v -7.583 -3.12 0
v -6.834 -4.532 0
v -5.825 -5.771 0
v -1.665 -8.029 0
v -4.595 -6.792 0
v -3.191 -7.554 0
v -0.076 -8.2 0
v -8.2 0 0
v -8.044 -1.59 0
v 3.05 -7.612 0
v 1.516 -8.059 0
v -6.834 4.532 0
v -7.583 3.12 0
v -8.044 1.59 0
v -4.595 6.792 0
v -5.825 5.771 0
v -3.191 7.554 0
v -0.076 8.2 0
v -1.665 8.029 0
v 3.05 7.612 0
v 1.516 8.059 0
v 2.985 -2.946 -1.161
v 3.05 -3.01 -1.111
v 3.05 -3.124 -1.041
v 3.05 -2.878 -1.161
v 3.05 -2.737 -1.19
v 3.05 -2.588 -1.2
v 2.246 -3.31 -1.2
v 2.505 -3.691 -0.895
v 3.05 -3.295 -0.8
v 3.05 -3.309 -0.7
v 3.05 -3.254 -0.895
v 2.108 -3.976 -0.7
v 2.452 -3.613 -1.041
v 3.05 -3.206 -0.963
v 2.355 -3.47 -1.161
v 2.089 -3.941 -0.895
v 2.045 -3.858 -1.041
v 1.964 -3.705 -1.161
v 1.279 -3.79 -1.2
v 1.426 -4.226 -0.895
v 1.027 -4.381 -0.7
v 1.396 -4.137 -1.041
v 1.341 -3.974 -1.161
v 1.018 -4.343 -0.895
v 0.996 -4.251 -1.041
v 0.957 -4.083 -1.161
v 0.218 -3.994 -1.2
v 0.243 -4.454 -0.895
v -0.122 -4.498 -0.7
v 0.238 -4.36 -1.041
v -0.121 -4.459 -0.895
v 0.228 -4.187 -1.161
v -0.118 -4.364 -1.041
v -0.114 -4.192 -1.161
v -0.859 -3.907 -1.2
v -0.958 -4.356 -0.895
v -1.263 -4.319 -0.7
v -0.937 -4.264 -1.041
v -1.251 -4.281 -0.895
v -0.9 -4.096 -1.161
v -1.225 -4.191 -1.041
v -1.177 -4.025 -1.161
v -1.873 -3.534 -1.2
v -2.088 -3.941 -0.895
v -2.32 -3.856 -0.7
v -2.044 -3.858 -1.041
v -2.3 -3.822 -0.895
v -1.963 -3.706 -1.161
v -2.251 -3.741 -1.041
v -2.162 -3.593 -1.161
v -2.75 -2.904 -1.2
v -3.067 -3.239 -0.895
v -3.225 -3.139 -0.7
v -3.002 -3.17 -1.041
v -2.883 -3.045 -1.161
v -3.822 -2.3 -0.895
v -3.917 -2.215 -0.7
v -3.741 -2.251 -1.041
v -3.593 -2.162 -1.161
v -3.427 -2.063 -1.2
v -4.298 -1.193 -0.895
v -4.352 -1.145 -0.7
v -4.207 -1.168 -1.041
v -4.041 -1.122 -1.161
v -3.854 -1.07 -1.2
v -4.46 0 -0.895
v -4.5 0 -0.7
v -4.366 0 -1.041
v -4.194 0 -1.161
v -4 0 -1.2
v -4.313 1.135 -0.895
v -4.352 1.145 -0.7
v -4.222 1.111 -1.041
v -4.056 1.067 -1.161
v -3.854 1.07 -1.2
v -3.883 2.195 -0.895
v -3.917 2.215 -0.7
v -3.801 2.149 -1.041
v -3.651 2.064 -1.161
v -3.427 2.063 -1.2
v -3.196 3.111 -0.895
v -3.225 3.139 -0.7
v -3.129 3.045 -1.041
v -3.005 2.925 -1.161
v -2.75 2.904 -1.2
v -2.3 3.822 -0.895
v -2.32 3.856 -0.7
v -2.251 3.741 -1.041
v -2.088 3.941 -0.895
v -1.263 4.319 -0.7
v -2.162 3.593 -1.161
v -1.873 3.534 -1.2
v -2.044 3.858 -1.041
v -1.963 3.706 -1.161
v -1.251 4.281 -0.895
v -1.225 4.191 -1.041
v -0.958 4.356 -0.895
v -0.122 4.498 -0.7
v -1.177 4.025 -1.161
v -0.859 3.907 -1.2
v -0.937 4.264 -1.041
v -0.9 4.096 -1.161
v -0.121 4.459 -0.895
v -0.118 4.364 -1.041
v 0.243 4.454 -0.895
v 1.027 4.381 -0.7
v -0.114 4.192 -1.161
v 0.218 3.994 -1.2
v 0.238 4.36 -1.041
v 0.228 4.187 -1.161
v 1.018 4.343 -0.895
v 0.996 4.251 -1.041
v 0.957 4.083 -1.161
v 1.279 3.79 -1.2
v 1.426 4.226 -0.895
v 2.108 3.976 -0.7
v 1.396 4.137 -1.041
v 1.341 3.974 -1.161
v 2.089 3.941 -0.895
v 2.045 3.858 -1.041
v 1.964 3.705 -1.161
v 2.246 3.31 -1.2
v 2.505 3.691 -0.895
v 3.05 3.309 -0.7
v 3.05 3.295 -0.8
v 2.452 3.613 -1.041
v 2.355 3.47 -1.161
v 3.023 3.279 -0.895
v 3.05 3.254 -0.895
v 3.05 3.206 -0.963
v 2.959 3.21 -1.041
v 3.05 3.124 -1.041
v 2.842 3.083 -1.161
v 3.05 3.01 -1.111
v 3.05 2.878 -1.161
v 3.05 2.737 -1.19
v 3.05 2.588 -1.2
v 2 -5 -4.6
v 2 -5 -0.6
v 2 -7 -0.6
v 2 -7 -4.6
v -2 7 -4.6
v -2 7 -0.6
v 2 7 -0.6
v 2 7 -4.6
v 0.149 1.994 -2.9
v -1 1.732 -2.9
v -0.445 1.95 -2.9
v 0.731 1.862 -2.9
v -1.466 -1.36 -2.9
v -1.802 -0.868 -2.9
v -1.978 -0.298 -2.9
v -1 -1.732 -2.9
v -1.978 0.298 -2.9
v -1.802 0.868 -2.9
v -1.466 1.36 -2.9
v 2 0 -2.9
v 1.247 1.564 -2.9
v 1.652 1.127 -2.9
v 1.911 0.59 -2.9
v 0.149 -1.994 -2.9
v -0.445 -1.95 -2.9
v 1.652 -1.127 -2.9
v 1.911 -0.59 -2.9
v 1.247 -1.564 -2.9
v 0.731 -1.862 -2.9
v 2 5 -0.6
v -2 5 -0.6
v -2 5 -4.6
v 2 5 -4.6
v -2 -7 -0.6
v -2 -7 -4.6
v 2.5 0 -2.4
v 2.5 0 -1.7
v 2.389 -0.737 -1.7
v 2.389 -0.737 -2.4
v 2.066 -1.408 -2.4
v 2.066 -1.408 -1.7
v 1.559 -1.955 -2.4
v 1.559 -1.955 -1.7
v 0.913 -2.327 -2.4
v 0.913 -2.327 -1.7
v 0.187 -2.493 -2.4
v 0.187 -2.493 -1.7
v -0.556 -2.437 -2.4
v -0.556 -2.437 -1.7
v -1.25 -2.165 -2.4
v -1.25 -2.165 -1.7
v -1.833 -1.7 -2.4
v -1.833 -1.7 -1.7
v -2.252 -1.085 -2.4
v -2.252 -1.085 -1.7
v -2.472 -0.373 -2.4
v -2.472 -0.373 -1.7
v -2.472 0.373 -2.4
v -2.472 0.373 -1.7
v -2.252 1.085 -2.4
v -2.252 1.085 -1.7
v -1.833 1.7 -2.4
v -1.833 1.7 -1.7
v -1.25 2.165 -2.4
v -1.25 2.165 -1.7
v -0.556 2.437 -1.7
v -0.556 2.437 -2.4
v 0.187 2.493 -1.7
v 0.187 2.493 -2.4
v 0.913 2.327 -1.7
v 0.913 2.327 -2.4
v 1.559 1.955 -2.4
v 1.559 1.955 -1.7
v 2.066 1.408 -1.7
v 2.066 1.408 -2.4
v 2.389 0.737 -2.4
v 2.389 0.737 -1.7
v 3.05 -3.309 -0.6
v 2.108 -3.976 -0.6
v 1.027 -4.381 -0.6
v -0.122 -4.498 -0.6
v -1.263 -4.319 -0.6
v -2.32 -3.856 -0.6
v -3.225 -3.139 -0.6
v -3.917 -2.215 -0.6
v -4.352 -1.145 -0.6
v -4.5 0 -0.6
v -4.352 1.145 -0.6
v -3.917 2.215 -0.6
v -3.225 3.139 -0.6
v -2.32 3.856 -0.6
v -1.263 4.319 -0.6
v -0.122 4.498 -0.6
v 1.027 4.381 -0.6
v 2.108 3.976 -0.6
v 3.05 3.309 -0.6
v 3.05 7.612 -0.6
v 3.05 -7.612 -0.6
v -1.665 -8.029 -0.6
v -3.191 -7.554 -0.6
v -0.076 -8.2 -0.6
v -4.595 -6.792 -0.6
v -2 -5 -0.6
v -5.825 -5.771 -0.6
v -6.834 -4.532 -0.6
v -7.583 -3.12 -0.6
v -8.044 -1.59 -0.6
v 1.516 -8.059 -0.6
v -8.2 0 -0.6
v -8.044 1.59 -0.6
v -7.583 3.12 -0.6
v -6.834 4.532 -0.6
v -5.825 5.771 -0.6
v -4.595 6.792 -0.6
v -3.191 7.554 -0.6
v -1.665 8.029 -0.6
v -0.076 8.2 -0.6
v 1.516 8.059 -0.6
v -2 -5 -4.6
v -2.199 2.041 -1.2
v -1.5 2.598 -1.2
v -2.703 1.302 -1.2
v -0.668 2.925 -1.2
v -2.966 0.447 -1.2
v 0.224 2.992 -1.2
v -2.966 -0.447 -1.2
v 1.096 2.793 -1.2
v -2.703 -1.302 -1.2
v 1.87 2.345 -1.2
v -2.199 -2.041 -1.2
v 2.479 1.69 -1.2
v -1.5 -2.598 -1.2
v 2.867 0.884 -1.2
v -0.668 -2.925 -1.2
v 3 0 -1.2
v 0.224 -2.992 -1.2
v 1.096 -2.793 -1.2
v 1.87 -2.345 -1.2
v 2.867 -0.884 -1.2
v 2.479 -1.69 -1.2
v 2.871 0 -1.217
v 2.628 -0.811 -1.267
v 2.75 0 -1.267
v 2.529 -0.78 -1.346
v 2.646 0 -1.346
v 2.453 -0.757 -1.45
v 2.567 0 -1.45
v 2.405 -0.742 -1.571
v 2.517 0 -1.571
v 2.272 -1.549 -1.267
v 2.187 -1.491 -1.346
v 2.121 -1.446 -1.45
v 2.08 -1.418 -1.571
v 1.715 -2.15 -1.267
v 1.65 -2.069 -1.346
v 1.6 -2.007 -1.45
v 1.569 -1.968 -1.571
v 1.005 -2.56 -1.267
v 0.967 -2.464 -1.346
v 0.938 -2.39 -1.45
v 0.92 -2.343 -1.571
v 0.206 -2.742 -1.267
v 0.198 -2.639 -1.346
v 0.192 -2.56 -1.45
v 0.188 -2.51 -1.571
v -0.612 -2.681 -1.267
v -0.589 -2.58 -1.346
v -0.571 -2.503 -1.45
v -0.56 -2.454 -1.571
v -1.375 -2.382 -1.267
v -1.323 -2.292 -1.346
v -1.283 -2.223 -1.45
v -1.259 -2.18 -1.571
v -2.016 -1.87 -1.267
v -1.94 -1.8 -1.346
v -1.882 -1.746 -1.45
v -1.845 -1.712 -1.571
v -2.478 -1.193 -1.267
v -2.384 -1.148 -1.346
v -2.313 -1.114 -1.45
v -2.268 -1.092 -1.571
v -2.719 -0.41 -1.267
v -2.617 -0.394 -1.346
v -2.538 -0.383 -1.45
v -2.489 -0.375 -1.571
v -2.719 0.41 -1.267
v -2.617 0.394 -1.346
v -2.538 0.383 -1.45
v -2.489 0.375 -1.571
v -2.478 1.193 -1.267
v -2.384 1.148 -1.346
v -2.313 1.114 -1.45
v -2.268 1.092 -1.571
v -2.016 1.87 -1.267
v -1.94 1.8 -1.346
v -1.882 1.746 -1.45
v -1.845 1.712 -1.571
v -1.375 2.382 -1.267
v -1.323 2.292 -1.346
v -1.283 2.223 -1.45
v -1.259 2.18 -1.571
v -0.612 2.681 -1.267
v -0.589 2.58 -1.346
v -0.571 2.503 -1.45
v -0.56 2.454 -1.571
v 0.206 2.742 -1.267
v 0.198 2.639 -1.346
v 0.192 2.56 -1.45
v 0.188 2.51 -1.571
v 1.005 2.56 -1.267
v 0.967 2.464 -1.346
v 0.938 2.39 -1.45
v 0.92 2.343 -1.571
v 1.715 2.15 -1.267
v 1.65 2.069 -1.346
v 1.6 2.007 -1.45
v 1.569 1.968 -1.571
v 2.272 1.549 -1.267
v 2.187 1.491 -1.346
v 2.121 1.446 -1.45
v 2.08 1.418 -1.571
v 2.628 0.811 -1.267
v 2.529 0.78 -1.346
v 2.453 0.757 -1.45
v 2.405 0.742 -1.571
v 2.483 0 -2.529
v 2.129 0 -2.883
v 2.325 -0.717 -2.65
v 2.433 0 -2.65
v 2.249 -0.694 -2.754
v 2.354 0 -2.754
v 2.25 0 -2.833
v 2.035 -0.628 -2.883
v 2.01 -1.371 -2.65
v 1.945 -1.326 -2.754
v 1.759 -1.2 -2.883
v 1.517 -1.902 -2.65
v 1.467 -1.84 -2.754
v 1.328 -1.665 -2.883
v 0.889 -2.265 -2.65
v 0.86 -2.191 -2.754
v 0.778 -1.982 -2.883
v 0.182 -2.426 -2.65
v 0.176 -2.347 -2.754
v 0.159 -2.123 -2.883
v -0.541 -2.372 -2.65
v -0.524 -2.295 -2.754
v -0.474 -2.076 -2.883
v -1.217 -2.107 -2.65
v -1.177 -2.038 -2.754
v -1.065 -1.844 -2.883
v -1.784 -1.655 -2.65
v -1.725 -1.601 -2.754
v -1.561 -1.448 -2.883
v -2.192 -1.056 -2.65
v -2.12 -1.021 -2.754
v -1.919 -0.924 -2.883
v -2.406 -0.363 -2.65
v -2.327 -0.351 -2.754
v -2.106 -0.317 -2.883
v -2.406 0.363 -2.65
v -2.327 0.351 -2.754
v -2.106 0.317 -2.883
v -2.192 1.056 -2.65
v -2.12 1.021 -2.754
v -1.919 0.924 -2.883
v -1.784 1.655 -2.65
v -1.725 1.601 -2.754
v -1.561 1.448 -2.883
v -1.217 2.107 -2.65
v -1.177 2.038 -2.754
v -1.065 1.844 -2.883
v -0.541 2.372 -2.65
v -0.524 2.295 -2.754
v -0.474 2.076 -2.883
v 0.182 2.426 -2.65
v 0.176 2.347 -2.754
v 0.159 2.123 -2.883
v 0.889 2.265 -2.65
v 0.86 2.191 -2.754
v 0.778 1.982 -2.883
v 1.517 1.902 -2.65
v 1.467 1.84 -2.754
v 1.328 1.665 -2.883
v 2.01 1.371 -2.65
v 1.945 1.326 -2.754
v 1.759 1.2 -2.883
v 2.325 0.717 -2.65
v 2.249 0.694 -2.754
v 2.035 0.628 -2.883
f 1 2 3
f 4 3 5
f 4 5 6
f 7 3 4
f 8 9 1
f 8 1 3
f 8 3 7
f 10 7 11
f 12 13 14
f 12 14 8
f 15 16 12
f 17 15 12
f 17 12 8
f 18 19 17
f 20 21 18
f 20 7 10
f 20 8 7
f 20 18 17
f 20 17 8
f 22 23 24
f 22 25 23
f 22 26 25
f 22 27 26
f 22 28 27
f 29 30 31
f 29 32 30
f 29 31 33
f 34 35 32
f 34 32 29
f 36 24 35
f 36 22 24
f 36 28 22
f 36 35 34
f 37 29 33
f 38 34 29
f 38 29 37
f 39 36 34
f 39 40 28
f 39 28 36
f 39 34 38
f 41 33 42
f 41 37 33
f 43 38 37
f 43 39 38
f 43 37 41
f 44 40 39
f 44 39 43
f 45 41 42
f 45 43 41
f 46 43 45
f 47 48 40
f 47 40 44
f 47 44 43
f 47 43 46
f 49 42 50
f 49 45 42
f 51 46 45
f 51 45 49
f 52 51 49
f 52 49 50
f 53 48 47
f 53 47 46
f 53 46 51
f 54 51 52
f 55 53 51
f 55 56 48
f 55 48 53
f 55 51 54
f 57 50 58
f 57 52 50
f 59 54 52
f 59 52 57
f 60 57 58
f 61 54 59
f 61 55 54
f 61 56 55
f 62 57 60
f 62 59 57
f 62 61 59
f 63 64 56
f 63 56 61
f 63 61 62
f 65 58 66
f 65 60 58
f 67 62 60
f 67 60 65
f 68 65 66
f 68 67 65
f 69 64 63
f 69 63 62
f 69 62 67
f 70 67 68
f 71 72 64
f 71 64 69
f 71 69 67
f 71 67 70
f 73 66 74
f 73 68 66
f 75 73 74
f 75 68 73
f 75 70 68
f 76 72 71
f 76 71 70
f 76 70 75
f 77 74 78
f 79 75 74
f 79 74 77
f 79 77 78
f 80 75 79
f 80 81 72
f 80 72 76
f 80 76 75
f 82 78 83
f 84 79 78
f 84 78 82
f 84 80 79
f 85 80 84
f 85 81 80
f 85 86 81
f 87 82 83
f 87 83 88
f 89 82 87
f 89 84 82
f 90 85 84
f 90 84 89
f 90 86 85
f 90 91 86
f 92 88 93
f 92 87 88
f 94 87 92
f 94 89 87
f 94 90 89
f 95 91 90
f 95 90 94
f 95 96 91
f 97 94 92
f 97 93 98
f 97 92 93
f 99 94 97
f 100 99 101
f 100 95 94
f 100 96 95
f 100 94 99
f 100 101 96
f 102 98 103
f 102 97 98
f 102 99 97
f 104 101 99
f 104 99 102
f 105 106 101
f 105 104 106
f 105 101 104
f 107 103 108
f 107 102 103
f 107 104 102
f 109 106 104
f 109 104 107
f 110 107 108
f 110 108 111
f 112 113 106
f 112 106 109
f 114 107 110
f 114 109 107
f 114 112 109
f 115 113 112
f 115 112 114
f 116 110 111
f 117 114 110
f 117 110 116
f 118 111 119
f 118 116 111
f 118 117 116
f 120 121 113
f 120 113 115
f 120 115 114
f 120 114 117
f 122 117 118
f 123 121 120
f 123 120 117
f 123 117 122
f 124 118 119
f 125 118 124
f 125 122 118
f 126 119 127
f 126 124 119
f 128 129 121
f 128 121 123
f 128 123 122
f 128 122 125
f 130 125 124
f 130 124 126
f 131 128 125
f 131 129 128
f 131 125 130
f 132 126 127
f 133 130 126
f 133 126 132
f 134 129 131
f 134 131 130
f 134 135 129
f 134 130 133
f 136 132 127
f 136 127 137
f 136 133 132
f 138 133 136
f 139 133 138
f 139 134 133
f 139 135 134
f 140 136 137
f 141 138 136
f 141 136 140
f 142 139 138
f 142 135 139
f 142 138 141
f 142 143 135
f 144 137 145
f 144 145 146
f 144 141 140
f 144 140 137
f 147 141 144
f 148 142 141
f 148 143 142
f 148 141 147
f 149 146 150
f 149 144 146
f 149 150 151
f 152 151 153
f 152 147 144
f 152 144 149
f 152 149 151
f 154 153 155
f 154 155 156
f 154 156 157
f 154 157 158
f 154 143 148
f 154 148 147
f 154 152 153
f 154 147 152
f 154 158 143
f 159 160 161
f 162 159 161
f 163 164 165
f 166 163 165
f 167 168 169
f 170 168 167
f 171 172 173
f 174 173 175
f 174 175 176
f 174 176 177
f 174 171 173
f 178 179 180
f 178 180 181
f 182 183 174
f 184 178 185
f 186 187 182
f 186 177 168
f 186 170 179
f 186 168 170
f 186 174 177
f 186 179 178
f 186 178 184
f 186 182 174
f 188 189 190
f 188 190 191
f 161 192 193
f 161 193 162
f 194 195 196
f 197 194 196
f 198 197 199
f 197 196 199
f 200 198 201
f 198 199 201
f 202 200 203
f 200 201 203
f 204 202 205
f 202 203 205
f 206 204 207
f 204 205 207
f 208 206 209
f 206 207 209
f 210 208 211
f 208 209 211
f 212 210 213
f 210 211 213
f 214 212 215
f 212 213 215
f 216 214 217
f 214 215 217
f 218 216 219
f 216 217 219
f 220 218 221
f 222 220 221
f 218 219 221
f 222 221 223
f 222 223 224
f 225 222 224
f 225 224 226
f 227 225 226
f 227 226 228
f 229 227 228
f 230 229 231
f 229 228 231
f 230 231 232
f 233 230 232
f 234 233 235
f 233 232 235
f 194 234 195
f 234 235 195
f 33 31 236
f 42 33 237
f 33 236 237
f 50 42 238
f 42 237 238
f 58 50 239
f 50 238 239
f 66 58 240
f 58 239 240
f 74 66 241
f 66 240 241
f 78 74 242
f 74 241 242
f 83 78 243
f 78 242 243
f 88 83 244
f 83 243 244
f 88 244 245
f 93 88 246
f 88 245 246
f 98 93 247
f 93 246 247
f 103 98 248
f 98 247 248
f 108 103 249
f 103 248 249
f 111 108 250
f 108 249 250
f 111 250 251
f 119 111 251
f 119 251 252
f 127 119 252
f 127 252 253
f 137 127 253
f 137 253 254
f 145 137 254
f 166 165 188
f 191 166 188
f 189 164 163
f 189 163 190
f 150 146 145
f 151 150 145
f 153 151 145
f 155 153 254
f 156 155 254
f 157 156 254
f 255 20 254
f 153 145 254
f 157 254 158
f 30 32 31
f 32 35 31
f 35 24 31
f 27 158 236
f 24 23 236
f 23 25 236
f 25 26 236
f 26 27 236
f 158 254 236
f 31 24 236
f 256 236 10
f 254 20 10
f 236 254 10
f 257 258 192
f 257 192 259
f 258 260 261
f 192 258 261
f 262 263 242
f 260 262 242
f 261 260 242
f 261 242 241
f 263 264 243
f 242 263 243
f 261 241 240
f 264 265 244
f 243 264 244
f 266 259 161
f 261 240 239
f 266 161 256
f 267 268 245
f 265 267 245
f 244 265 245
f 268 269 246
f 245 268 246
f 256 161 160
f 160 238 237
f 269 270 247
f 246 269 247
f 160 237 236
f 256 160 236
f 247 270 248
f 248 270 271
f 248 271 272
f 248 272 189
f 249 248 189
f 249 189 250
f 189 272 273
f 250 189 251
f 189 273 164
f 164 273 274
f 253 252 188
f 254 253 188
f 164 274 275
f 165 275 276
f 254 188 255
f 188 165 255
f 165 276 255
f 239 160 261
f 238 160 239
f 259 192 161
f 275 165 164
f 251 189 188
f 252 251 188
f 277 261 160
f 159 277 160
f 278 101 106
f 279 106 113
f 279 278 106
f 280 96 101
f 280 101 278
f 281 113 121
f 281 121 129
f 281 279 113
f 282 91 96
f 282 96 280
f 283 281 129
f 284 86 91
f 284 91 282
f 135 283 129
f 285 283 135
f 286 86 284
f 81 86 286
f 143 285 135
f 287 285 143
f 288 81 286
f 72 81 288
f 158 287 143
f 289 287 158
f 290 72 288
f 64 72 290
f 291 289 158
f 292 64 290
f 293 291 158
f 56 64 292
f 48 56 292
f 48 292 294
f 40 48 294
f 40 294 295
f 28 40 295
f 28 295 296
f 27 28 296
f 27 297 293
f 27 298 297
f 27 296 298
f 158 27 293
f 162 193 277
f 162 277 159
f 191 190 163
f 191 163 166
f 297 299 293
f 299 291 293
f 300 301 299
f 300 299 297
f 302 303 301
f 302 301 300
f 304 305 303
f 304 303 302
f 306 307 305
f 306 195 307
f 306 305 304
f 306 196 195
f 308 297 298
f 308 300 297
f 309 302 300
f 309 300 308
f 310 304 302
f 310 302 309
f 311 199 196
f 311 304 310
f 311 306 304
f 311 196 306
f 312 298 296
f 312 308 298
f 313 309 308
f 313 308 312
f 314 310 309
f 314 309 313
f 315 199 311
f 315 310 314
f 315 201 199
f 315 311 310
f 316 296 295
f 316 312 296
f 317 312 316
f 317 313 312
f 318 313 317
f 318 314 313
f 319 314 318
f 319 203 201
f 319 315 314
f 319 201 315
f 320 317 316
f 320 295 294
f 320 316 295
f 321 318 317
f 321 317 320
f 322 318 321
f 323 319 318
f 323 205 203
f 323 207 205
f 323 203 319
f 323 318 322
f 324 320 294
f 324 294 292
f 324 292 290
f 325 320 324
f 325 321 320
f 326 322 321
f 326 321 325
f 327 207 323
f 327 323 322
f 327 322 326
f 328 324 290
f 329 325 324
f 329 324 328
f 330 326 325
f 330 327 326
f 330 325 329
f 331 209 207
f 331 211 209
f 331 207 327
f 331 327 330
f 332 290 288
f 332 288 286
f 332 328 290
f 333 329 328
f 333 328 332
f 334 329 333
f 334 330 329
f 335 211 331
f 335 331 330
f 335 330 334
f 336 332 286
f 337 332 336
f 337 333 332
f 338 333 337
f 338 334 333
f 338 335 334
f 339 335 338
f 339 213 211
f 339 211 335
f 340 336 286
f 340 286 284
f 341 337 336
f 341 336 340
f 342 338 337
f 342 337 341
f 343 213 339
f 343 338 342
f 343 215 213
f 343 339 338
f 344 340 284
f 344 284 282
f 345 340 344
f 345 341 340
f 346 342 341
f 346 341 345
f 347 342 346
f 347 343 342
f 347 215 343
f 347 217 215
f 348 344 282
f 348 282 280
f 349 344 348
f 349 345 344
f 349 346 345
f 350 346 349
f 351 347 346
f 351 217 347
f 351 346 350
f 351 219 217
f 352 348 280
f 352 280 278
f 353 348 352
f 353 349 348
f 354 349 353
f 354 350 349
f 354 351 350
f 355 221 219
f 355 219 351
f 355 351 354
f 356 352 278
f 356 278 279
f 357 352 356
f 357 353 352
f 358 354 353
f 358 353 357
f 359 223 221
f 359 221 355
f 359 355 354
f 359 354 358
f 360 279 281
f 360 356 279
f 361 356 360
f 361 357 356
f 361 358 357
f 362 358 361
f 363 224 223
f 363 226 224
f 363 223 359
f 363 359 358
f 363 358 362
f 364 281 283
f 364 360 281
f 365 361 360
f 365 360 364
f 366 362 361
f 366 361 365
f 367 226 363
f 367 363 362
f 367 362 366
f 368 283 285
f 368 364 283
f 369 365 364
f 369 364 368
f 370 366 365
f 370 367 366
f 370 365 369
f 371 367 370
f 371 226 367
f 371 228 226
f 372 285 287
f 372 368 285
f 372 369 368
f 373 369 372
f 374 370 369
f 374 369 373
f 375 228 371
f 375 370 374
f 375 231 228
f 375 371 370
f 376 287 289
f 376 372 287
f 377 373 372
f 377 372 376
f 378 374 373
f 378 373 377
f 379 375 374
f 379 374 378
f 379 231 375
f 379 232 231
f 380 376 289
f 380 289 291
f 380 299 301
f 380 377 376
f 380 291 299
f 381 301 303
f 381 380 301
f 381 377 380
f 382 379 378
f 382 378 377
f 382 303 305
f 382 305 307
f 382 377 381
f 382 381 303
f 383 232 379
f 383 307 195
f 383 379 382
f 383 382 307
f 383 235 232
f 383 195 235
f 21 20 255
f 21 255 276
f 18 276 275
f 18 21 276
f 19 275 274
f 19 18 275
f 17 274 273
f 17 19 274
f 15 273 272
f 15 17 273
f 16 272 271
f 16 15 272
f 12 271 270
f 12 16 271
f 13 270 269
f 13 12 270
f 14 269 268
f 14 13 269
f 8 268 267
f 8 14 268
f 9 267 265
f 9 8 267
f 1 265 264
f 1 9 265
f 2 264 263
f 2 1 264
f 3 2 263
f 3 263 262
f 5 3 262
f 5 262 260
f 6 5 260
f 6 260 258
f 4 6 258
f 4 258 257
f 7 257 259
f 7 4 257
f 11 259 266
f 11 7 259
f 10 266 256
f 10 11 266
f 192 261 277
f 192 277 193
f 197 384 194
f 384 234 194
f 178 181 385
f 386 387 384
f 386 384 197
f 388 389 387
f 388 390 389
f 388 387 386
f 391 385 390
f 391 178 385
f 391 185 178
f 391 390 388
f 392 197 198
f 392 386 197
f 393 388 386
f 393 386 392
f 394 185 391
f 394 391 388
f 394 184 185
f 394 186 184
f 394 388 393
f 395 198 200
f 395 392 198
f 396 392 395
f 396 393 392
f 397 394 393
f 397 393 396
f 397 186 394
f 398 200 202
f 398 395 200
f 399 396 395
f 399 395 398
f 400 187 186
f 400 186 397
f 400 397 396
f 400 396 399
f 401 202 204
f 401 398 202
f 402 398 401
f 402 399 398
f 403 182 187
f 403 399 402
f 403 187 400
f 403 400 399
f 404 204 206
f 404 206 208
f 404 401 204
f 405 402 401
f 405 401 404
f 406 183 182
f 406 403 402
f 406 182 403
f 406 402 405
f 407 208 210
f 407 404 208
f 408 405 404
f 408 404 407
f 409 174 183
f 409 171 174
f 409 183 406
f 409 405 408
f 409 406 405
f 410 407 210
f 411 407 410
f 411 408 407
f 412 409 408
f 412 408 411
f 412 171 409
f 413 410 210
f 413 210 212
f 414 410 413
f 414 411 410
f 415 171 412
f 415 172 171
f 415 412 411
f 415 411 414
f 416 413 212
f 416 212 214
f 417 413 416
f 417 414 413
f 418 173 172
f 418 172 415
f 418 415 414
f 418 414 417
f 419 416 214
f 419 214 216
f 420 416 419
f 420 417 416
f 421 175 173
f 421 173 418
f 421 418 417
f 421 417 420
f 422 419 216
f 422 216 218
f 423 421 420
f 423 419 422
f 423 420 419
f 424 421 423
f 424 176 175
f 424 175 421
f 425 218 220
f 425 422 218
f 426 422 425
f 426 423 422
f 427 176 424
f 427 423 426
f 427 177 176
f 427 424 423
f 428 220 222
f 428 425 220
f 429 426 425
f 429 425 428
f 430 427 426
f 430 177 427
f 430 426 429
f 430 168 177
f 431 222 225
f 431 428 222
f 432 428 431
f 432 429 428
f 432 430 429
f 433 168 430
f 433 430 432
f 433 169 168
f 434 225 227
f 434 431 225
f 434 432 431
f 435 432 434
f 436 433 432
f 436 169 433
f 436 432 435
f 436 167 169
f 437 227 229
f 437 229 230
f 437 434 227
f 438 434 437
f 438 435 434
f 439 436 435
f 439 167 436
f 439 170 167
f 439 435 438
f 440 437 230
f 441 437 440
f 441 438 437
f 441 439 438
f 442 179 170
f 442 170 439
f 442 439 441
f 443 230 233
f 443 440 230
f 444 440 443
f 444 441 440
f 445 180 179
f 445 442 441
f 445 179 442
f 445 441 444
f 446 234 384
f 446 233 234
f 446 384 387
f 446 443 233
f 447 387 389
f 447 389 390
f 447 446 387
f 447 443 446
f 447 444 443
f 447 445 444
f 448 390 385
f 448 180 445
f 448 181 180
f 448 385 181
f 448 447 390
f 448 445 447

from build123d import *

# Parameters (mm, degrees)
PAD_DEPTH    = 0.6
PAD008_DEPTH = 0.6
FILLET_R     = 0.5
SKETCH018_R  = 2.5
PAD009_DEPTH = 1.7
FILLET001_R  = 0.5
SKETCH019_W  = 4
SKETCH019_H  = 2
PAD010_DEPTH = 4


with BuildPart() as part:
    # Sketch → Pad (new body)
    with BuildSketch(Plane.XY):
        with BuildLine():
            ThreePointArc((3.05, 7.6116686738), (-8.2, 0), (3.05, -7.6116686738))
            Line((3.05, 7.6116686738), (3.05, -7.6116686738))
        make_face()
    extrude(amount=-PAD_DEPTH)

    # Sketch017 (on Face4 of Pad) → Pad008 (join)
    with BuildSketch(Plane(origin=(0, 0, -0.6), x_dir=(1, 0, 0), z_dir=(0, 0, -1))):
        with BuildLine():
            ThreePointArc((3.0499999999, 3.3087006514), (-4.5, 0), (3.0499999999, -3.3087006514))
            Line((3.0499999999, 3.3087006514), (3.0499999999, -3.3087006514))
        make_face()
    extrude(amount=PAD008_DEPTH)

    # Fillet
    fillet_edges = [part.edges().sort_by_distance(p)[0] for p in [
        (-4.5, 0, -1.2),
    ]]
    fillet(fillet_edges, radius=FILLET_R)

    # Sketch018 (on Face5 of Fillet) → Pad009 (join)
    with BuildSketch(Plane(origin=(0, 0, -1.2), x_dir=(1, 0, 0), z_dir=(0, 0, -1))):
        Circle(SKETCH018_R)
    extrude(amount=PAD009_DEPTH)

    # Fillet001
    fillet001_edges = [part.edges().sort_by_distance(p)[0] for p in [
        (-2.5, 0, -2.9),
        (-2.5, 0, -1.2),
    ]]
    fillet(fillet001_edges, radius=FILLET001_R)

    # Sketch019 (on Face7 of Fillet001) → Pad010 (join)
    with BuildSketch(Plane(origin=(0, 0, -0.6), x_dir=(1, 0, 0), z_dir=(0, 0, -1))):
        with Locations((0, 6)):
            Rectangle(SKETCH019_W, SKETCH019_H)
        with Locations((0, -6)):
            Rectangle(SKETCH019_W, SKETCH019_H)
    extrude(amount=PAD010_DEPTH)


solid = part.part
